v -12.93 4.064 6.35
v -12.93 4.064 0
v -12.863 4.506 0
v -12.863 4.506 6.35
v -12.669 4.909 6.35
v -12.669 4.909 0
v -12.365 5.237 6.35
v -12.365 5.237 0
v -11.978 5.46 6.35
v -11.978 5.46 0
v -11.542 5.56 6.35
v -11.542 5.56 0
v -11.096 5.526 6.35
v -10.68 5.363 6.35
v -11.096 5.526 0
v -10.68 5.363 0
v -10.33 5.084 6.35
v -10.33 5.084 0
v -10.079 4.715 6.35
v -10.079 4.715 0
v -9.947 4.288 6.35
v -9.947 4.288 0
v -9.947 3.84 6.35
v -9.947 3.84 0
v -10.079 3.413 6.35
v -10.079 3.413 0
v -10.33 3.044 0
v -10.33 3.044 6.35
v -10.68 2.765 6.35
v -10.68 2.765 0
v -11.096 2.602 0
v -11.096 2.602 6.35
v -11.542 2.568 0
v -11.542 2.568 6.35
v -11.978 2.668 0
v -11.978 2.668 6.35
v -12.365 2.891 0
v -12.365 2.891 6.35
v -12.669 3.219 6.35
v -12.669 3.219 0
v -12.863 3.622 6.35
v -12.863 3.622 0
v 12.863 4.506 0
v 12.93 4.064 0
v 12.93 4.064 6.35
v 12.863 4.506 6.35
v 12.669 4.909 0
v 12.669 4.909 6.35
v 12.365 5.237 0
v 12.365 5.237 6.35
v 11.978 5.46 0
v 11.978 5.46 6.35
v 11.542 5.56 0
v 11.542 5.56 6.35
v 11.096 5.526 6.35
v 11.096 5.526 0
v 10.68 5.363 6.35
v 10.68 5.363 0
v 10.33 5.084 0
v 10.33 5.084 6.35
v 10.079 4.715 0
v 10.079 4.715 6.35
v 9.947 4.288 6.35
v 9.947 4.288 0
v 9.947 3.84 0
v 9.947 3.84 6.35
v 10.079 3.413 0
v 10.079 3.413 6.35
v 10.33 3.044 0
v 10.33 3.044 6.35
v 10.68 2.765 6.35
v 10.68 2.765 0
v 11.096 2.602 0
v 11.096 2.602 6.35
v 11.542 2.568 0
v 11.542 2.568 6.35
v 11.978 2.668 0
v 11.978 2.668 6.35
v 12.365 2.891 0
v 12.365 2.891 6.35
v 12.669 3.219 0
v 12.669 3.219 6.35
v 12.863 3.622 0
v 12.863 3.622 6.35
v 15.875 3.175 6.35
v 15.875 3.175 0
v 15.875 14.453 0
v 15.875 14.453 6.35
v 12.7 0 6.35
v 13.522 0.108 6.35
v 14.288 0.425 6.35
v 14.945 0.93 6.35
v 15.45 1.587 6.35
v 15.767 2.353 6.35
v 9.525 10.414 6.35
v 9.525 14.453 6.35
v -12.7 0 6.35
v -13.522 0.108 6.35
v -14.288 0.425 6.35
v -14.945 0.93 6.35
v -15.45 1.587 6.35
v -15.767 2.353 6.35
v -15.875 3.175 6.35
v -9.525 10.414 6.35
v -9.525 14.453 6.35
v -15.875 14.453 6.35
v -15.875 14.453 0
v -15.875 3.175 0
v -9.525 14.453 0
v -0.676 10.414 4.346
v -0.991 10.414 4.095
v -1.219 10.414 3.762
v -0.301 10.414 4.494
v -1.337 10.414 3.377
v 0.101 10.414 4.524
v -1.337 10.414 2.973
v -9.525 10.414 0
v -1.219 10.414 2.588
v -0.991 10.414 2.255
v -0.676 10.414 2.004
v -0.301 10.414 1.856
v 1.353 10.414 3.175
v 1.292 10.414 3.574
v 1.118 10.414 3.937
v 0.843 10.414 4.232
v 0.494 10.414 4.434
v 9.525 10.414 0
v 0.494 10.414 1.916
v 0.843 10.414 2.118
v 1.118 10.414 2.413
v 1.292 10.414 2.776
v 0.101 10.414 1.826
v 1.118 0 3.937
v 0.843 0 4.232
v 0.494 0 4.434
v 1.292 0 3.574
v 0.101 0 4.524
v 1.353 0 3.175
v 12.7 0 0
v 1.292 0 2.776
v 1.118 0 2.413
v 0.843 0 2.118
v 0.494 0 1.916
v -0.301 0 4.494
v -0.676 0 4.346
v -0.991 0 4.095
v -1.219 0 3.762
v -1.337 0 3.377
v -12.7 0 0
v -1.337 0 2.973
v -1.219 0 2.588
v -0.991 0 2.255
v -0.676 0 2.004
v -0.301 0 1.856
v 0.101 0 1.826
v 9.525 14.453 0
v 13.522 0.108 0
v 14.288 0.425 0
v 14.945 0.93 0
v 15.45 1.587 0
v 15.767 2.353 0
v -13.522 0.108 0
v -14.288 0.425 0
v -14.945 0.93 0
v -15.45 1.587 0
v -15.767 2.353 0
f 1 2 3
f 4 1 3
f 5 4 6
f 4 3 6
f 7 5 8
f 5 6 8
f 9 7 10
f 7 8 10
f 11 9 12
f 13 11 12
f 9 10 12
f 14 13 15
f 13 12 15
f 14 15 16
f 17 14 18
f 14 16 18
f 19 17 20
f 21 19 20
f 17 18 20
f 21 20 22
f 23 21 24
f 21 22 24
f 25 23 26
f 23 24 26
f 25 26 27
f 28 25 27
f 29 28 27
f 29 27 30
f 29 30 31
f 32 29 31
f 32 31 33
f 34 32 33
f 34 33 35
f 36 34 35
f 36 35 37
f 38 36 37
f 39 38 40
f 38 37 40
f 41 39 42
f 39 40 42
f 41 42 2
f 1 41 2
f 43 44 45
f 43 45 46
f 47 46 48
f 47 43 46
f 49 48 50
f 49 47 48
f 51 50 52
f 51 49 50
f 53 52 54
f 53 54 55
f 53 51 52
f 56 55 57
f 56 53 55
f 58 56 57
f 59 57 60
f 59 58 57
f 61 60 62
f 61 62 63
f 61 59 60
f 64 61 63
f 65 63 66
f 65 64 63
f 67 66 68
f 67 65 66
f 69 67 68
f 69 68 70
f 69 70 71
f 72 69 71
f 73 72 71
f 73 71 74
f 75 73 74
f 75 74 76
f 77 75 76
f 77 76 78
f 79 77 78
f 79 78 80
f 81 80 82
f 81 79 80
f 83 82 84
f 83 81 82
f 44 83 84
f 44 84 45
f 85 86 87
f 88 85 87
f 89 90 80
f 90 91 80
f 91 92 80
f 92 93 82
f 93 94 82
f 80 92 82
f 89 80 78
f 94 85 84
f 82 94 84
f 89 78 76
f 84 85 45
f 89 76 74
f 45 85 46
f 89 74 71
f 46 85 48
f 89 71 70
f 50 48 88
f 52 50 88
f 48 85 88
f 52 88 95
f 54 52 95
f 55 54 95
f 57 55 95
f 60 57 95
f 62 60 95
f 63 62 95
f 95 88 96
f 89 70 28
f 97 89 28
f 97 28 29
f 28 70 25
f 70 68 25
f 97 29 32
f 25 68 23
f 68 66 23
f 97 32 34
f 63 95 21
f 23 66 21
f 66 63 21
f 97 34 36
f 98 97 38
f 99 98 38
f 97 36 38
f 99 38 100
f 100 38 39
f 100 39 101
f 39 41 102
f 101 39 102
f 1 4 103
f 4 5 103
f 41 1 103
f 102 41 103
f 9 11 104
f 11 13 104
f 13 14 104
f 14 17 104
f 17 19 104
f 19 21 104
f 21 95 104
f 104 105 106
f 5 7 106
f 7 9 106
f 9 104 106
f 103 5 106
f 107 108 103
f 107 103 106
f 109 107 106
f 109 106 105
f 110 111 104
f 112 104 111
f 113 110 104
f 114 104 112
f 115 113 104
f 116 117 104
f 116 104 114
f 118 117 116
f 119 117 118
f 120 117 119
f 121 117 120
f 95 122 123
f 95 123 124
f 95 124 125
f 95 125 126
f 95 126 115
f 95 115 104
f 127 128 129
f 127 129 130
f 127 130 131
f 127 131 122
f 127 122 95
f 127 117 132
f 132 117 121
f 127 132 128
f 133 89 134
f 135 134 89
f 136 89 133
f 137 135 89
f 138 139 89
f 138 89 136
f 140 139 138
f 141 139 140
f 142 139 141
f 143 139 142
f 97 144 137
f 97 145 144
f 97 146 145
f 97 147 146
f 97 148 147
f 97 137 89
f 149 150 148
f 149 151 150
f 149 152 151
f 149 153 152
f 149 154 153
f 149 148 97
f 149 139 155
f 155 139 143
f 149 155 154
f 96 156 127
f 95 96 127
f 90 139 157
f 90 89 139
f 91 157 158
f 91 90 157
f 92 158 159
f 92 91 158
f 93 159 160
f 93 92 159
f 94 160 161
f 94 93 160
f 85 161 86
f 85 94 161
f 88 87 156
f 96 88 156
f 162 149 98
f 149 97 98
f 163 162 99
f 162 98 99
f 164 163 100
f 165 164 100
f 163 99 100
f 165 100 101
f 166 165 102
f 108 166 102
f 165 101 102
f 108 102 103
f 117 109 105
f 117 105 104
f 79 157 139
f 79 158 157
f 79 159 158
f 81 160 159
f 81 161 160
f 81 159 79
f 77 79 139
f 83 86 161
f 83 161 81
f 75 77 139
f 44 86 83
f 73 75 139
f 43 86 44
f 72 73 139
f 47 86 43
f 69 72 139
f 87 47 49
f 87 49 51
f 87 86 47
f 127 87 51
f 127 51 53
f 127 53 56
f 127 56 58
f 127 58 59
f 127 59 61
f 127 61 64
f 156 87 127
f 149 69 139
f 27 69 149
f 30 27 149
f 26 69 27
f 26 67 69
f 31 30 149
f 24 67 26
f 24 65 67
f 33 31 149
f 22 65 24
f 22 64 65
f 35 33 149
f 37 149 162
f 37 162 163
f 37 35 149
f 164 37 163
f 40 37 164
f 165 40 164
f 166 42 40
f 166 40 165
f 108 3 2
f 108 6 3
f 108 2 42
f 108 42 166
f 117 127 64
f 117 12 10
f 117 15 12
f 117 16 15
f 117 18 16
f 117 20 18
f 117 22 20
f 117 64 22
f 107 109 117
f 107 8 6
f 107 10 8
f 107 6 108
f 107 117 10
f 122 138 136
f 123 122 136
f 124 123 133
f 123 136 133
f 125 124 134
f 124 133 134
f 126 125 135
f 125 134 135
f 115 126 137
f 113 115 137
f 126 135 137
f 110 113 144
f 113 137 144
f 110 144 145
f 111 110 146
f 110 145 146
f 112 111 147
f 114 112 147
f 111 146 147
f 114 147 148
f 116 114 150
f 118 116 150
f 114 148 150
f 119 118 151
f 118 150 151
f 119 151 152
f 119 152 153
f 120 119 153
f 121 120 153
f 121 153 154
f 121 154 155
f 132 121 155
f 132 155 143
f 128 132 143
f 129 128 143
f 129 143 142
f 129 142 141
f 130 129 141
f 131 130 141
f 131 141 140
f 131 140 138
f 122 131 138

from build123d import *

# Parameters (mm, degrees)
SKETCH1_R           = 1.5
BOSS_EXTRUDE1_DEPTH = 6.35
SKETCH2_R           = 1.35255
CUT_EXTRUDE1_DEPTH  = 15.4526
FILLET1_R           = 3.175


with BuildPart() as part:
    # Sketch1 → Boss-Extrude1 (new body)
    with BuildSketch(Plane.XY):
        Polygon((0, 0), (15.875, 0), (15.875, 14.4526), (9.525, 14.4526), (9.525, 10.414), (0, 10.414), align=None)
        with Locations((11.43, 4.064)):
            Circle(SKETCH1_R, mode=Mode.SUBTRACT)
    boss_extrude1 = extrude(amount=BOSS_EXTRUDE1_DEPTH)

    # Mirror1: Boss-Extrude1 across plane
    add(boss_extrude1.mirror(Plane(origin=(0, 10.414, 6.35), x_dir=(0, 0, 1), z_dir=(1, 0, 0))))

    # Sketch2 → Cut-Extrude1 (cut, through all)
    with BuildSketch(Plane.XZ):
        with Locations((0, 3.175)):
            Circle(SKETCH2_R)
    extrude(amount=-CUT_EXTRUDE1_DEPTH, mode=Mode.SUBTRACT)

    # Fillet1
    fillet1_edges = [part.edges().sort_by_distance(p)[0] for p in [
        (15.875, 0, 3.175),
        (-15.875, 0, 3.175),
    ]]
    fillet(fillet1_edges, radius=FILLET1_R)


solid = part.part
